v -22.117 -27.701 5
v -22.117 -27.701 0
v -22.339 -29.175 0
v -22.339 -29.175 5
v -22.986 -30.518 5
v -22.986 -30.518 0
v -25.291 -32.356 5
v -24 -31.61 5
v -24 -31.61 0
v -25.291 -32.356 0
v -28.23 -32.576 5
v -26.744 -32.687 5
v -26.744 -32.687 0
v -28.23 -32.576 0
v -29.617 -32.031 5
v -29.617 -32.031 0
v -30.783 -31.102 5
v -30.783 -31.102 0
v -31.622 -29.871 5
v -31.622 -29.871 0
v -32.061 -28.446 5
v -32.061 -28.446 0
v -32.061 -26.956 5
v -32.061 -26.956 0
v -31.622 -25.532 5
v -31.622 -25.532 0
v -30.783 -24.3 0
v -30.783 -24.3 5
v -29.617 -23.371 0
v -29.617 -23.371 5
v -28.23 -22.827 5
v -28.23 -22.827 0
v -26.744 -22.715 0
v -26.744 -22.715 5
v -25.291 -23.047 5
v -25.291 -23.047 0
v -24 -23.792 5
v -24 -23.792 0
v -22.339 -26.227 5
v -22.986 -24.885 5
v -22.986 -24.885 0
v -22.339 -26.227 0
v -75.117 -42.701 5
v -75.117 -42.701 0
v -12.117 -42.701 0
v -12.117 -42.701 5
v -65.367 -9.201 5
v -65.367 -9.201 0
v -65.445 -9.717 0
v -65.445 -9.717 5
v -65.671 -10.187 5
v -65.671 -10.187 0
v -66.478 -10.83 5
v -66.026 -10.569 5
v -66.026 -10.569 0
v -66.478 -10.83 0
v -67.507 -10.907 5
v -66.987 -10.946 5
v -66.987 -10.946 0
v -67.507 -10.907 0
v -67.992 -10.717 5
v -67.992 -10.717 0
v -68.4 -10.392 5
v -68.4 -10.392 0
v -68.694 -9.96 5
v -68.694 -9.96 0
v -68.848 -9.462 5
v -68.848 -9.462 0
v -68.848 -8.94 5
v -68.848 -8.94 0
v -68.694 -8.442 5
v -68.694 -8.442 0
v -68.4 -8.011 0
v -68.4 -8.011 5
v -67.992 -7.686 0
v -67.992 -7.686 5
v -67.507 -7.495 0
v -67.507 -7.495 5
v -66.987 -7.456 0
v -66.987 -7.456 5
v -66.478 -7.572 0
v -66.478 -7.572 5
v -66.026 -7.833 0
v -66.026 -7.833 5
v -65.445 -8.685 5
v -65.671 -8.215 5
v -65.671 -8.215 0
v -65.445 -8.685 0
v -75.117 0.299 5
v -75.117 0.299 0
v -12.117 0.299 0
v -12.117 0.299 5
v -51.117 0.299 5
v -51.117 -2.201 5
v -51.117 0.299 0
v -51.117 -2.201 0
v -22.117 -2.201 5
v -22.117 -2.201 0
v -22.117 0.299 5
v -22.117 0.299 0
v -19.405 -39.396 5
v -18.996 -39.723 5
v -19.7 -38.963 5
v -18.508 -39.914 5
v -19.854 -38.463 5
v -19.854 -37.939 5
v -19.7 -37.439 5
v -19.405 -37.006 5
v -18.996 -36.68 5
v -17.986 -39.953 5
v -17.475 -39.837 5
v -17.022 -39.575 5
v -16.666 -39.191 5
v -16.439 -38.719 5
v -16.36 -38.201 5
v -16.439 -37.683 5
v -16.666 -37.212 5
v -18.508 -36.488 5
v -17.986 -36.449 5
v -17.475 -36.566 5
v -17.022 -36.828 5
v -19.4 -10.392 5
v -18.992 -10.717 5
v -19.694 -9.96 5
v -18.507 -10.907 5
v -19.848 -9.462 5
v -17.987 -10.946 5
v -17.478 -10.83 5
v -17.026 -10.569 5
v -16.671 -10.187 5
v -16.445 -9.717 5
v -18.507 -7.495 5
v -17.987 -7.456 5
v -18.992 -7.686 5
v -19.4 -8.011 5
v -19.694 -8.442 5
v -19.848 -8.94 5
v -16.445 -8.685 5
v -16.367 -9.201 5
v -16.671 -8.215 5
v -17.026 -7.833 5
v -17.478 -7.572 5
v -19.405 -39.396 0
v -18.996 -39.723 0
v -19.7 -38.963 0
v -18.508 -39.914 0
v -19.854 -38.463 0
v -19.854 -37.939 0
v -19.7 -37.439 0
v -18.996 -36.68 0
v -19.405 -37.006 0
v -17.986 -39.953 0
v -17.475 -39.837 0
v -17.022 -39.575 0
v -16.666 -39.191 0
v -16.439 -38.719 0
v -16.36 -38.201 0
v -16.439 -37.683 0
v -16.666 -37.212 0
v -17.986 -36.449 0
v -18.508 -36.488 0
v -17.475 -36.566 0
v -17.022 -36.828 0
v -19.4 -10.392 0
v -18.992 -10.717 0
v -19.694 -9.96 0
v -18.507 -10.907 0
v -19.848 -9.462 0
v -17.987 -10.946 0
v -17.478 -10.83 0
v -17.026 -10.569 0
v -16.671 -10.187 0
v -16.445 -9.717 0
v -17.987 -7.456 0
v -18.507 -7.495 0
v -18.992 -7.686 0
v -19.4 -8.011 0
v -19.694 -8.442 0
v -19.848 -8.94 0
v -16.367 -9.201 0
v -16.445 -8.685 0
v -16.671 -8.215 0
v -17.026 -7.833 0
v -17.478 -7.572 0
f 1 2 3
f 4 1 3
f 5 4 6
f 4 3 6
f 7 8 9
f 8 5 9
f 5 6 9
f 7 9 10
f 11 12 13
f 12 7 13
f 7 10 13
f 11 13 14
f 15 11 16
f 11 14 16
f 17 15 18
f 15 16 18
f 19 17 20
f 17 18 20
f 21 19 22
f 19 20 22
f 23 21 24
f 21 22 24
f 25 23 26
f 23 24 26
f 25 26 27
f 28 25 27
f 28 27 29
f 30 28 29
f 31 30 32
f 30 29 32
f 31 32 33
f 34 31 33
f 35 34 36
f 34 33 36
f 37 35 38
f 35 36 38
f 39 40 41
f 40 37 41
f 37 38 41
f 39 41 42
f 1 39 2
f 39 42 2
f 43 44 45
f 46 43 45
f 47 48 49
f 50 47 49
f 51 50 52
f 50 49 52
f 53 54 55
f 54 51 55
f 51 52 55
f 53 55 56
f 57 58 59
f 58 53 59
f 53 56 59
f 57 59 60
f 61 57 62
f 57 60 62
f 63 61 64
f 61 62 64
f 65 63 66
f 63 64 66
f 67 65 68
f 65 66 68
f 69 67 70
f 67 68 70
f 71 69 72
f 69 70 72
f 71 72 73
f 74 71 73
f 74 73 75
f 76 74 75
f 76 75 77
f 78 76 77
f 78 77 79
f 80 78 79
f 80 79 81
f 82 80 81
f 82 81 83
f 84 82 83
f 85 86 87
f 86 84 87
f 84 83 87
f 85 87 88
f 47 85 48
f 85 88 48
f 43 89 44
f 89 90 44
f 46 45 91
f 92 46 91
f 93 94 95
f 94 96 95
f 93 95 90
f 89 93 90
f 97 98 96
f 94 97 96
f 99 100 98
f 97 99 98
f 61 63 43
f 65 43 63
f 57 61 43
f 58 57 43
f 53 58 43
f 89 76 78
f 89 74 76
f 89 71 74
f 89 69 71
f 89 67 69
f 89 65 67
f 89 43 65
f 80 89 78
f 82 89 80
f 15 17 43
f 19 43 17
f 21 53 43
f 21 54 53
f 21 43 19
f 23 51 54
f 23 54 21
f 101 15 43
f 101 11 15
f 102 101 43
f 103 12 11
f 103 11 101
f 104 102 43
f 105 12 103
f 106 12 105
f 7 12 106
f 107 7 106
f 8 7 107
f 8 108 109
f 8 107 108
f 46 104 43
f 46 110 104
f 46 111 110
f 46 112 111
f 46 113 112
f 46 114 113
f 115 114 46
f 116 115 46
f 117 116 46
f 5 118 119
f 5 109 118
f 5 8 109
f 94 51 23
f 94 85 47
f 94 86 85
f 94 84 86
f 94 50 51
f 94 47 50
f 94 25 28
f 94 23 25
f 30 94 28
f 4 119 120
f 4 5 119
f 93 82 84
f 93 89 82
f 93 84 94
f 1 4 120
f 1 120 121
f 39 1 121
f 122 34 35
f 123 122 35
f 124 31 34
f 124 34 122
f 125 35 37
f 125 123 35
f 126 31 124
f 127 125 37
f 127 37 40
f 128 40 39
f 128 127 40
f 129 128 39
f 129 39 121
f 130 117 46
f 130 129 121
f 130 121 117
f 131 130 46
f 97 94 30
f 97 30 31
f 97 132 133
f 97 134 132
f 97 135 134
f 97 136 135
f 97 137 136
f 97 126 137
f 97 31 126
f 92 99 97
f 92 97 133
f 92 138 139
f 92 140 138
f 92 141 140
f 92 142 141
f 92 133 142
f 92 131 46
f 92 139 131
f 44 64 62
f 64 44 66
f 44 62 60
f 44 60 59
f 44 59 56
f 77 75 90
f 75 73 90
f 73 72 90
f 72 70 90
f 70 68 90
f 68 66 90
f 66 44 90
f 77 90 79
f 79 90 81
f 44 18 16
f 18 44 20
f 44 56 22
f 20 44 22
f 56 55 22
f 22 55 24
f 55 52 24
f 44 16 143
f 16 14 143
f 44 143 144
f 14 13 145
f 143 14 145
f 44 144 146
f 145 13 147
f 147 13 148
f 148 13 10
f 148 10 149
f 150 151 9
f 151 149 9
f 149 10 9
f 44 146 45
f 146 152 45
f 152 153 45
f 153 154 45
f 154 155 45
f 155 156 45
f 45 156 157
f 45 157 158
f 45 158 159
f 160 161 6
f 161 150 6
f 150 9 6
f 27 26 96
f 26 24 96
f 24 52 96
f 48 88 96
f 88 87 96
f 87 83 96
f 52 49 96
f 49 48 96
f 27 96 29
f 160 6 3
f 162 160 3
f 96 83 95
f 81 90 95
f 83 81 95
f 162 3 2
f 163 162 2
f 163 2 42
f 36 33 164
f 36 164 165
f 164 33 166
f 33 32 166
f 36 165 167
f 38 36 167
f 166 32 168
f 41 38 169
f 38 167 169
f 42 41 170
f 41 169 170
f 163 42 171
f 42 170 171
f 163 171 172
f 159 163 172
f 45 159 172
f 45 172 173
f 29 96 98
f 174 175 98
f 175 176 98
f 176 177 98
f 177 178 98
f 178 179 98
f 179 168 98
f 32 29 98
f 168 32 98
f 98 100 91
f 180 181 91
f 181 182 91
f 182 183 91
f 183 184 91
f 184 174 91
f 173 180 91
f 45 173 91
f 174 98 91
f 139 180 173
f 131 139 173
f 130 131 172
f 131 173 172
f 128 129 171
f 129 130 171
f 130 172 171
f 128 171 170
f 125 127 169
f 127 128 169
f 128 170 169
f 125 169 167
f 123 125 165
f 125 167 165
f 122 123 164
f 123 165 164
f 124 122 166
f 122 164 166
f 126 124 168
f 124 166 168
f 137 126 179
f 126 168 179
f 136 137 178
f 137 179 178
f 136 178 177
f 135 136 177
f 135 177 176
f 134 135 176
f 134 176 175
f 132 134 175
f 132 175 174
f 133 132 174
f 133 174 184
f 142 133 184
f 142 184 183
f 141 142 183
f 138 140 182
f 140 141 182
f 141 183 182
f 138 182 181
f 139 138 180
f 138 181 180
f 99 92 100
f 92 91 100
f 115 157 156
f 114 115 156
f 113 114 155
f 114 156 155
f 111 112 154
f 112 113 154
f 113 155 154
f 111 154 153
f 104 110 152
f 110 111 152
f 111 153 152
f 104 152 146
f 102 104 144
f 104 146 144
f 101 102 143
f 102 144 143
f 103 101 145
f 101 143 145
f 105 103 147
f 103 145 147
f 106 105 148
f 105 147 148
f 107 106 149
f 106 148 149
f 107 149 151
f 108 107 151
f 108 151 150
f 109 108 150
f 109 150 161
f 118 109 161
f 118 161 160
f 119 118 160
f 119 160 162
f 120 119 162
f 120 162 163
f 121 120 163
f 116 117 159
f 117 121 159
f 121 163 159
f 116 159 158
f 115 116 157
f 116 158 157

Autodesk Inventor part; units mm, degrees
ref_plane "YZ Plane" through (0, 0, 0) normal (1, 0, 0) x (0, 1, 0)
ref_plane "XZ Plane" through (0, 0, 0) normal (0, 1, 0) x (-1, 0, 0)
ref_plane "XY Plane" through (0, 0, 0) normal (0, 0, 1) x (1, 0, 0)
sketch "Boceto1" plane through (0, 0, 0) normal (0, 0, 1) x (1, 0, 0)
  line L0 (-12.1173, 0.2988) -> (-22.1173, 0.2988)
  line L1 (-22.1173, 0.2988) -> (-22.1173, -2.2012)
  line L2 (-22.1173, -2.2012) -> (-51.1173, -2.2012)
  line L3 (-51.1173, -2.2012) -> (-51.1173, 0.2988)
  line L4 (-51.1173, 0.2988) -> (-75.1173, 0.2988)
  line L5 (-75.1173, 0.2988) -> (-75.1173, -42.7012)
  line L6 (-75.1173, -42.7012) -> (-12.1173, -42.7012)
  line L7 (-12.1173, -42.7012) -> (-12.1173, 0.2988)
  circle A0 centre (-18.1173, -9.2012) radius 1.75
  circle A1 centre (-67.1173, -9.2012) radius 1.75
  circle A2 centre (-18.1173, -38.2012) radius 1.7568
  circle A3 centre (-27.1173, -27.7012) radius 5
  point P0 (0, 0)
extrude "Extrusión1" add sketch "Boceto1" along normal blind 5
properties part number "carro x lado motor pieza 2parte 2-2"
